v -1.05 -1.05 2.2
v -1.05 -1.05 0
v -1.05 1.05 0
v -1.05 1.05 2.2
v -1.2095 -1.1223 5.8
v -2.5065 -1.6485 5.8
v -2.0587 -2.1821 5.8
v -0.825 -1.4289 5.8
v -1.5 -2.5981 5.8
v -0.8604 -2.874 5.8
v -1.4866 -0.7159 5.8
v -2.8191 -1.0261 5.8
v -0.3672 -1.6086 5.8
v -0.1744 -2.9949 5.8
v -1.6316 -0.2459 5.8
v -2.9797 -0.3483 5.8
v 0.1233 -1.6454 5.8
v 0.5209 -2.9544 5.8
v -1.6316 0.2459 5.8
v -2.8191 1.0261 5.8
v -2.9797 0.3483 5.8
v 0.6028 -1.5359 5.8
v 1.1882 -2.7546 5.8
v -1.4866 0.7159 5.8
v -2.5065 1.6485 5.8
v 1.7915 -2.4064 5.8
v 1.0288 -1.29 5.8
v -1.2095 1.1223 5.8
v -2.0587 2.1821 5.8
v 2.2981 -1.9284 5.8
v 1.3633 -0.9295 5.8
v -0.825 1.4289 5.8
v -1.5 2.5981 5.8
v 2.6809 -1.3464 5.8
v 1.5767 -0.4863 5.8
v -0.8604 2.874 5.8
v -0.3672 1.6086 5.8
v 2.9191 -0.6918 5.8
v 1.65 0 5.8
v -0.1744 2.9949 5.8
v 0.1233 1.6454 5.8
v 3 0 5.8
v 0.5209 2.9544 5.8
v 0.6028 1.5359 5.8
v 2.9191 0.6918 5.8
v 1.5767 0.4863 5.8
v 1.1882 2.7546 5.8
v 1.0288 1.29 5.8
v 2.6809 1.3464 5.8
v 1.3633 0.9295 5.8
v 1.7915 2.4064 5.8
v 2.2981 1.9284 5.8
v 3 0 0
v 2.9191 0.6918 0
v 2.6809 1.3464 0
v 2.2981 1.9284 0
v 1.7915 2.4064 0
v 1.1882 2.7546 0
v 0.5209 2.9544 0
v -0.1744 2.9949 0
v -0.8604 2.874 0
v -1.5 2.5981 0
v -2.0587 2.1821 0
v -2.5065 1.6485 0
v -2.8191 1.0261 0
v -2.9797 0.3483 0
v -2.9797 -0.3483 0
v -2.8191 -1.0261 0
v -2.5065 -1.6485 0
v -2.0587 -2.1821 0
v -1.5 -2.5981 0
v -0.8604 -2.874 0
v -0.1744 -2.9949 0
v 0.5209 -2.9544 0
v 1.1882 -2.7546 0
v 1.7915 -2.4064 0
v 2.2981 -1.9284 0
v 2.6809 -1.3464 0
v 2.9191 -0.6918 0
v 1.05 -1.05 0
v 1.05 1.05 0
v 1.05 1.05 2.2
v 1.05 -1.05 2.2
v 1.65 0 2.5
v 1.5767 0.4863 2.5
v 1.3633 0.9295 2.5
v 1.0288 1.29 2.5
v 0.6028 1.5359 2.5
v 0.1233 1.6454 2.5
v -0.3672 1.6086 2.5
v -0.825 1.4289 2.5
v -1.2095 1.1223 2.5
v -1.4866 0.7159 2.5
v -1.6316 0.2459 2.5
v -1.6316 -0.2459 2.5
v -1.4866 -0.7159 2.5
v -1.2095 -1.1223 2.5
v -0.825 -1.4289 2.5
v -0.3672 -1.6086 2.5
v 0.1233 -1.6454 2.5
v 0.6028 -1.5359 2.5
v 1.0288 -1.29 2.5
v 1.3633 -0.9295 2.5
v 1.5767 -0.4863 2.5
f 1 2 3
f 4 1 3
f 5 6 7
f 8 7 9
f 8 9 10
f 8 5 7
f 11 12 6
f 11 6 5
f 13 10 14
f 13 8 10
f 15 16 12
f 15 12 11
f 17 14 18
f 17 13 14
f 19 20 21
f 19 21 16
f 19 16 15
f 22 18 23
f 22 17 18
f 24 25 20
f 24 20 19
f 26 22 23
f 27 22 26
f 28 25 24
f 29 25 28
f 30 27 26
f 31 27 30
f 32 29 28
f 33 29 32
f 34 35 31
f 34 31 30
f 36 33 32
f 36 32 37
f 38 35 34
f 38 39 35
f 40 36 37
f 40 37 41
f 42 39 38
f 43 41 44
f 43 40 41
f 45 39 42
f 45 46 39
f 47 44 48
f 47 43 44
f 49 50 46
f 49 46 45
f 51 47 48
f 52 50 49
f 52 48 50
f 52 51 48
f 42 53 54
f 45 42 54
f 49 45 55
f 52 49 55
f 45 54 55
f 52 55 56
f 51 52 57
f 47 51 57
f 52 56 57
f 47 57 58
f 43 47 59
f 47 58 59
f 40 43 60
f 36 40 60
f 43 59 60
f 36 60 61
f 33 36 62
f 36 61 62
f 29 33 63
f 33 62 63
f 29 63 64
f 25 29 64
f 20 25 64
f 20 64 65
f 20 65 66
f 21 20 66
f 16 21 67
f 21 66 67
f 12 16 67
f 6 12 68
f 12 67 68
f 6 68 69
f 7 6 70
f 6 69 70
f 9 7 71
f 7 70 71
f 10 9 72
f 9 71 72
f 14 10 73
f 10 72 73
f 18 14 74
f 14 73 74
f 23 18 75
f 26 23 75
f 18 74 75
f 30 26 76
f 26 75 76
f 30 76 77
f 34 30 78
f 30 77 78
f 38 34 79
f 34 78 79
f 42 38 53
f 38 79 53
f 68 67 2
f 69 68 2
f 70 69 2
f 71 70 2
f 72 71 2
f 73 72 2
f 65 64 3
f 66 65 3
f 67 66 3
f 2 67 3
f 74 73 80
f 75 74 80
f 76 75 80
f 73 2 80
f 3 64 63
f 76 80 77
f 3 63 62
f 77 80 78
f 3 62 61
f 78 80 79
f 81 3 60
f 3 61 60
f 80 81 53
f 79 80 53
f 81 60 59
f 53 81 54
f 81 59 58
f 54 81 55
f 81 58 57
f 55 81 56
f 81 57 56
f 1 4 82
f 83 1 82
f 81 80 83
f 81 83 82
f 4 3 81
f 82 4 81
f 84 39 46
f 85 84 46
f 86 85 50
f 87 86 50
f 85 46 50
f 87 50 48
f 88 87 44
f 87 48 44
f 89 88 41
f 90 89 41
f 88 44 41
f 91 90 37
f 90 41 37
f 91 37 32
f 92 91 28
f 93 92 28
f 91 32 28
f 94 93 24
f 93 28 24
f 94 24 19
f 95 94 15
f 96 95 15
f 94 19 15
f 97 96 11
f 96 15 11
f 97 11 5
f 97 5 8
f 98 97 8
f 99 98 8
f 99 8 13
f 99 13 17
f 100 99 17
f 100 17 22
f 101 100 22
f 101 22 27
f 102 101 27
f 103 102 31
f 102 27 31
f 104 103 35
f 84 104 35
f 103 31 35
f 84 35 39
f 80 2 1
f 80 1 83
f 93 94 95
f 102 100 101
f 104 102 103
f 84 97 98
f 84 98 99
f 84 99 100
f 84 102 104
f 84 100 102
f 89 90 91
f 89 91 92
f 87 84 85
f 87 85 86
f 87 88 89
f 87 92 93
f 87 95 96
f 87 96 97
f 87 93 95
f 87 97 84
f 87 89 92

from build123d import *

# Parameters (mm, degrees)
SKETCH006_R     = 3
PAD001_DEPTH    = 5.8
SKETCH007_W     = 2.1
SKETCH007_H     = 2.1
POCKET001_DEPTH = 2.2
SKETCH008_R     = 1.65
POCKET002_DEPTH = 3.3


with BuildPart() as part:
    # Sketch006 → Pad001 (new body)
    with BuildSketch(Plane.XY):
        Circle(SKETCH006_R)
    extrude(amount=PAD001_DEPTH)

    # Sketch007 → Pocket001 (cut)
    with BuildSketch(Plane.XY):
        Rectangle(SKETCH007_W, SKETCH007_H)
    extrude(amount=POCKET001_DEPTH, mode=Mode.SUBTRACT)

    # Sketch008 (on Face3 of Pocket001) → Pocket002 (cut)
    with BuildSketch(Plane.XY.offset(5.8)):
        Circle(SKETCH008_R)
    extrude(amount=-POCKET002_DEPTH, mode=Mode.SUBTRACT)


solid = part.part
